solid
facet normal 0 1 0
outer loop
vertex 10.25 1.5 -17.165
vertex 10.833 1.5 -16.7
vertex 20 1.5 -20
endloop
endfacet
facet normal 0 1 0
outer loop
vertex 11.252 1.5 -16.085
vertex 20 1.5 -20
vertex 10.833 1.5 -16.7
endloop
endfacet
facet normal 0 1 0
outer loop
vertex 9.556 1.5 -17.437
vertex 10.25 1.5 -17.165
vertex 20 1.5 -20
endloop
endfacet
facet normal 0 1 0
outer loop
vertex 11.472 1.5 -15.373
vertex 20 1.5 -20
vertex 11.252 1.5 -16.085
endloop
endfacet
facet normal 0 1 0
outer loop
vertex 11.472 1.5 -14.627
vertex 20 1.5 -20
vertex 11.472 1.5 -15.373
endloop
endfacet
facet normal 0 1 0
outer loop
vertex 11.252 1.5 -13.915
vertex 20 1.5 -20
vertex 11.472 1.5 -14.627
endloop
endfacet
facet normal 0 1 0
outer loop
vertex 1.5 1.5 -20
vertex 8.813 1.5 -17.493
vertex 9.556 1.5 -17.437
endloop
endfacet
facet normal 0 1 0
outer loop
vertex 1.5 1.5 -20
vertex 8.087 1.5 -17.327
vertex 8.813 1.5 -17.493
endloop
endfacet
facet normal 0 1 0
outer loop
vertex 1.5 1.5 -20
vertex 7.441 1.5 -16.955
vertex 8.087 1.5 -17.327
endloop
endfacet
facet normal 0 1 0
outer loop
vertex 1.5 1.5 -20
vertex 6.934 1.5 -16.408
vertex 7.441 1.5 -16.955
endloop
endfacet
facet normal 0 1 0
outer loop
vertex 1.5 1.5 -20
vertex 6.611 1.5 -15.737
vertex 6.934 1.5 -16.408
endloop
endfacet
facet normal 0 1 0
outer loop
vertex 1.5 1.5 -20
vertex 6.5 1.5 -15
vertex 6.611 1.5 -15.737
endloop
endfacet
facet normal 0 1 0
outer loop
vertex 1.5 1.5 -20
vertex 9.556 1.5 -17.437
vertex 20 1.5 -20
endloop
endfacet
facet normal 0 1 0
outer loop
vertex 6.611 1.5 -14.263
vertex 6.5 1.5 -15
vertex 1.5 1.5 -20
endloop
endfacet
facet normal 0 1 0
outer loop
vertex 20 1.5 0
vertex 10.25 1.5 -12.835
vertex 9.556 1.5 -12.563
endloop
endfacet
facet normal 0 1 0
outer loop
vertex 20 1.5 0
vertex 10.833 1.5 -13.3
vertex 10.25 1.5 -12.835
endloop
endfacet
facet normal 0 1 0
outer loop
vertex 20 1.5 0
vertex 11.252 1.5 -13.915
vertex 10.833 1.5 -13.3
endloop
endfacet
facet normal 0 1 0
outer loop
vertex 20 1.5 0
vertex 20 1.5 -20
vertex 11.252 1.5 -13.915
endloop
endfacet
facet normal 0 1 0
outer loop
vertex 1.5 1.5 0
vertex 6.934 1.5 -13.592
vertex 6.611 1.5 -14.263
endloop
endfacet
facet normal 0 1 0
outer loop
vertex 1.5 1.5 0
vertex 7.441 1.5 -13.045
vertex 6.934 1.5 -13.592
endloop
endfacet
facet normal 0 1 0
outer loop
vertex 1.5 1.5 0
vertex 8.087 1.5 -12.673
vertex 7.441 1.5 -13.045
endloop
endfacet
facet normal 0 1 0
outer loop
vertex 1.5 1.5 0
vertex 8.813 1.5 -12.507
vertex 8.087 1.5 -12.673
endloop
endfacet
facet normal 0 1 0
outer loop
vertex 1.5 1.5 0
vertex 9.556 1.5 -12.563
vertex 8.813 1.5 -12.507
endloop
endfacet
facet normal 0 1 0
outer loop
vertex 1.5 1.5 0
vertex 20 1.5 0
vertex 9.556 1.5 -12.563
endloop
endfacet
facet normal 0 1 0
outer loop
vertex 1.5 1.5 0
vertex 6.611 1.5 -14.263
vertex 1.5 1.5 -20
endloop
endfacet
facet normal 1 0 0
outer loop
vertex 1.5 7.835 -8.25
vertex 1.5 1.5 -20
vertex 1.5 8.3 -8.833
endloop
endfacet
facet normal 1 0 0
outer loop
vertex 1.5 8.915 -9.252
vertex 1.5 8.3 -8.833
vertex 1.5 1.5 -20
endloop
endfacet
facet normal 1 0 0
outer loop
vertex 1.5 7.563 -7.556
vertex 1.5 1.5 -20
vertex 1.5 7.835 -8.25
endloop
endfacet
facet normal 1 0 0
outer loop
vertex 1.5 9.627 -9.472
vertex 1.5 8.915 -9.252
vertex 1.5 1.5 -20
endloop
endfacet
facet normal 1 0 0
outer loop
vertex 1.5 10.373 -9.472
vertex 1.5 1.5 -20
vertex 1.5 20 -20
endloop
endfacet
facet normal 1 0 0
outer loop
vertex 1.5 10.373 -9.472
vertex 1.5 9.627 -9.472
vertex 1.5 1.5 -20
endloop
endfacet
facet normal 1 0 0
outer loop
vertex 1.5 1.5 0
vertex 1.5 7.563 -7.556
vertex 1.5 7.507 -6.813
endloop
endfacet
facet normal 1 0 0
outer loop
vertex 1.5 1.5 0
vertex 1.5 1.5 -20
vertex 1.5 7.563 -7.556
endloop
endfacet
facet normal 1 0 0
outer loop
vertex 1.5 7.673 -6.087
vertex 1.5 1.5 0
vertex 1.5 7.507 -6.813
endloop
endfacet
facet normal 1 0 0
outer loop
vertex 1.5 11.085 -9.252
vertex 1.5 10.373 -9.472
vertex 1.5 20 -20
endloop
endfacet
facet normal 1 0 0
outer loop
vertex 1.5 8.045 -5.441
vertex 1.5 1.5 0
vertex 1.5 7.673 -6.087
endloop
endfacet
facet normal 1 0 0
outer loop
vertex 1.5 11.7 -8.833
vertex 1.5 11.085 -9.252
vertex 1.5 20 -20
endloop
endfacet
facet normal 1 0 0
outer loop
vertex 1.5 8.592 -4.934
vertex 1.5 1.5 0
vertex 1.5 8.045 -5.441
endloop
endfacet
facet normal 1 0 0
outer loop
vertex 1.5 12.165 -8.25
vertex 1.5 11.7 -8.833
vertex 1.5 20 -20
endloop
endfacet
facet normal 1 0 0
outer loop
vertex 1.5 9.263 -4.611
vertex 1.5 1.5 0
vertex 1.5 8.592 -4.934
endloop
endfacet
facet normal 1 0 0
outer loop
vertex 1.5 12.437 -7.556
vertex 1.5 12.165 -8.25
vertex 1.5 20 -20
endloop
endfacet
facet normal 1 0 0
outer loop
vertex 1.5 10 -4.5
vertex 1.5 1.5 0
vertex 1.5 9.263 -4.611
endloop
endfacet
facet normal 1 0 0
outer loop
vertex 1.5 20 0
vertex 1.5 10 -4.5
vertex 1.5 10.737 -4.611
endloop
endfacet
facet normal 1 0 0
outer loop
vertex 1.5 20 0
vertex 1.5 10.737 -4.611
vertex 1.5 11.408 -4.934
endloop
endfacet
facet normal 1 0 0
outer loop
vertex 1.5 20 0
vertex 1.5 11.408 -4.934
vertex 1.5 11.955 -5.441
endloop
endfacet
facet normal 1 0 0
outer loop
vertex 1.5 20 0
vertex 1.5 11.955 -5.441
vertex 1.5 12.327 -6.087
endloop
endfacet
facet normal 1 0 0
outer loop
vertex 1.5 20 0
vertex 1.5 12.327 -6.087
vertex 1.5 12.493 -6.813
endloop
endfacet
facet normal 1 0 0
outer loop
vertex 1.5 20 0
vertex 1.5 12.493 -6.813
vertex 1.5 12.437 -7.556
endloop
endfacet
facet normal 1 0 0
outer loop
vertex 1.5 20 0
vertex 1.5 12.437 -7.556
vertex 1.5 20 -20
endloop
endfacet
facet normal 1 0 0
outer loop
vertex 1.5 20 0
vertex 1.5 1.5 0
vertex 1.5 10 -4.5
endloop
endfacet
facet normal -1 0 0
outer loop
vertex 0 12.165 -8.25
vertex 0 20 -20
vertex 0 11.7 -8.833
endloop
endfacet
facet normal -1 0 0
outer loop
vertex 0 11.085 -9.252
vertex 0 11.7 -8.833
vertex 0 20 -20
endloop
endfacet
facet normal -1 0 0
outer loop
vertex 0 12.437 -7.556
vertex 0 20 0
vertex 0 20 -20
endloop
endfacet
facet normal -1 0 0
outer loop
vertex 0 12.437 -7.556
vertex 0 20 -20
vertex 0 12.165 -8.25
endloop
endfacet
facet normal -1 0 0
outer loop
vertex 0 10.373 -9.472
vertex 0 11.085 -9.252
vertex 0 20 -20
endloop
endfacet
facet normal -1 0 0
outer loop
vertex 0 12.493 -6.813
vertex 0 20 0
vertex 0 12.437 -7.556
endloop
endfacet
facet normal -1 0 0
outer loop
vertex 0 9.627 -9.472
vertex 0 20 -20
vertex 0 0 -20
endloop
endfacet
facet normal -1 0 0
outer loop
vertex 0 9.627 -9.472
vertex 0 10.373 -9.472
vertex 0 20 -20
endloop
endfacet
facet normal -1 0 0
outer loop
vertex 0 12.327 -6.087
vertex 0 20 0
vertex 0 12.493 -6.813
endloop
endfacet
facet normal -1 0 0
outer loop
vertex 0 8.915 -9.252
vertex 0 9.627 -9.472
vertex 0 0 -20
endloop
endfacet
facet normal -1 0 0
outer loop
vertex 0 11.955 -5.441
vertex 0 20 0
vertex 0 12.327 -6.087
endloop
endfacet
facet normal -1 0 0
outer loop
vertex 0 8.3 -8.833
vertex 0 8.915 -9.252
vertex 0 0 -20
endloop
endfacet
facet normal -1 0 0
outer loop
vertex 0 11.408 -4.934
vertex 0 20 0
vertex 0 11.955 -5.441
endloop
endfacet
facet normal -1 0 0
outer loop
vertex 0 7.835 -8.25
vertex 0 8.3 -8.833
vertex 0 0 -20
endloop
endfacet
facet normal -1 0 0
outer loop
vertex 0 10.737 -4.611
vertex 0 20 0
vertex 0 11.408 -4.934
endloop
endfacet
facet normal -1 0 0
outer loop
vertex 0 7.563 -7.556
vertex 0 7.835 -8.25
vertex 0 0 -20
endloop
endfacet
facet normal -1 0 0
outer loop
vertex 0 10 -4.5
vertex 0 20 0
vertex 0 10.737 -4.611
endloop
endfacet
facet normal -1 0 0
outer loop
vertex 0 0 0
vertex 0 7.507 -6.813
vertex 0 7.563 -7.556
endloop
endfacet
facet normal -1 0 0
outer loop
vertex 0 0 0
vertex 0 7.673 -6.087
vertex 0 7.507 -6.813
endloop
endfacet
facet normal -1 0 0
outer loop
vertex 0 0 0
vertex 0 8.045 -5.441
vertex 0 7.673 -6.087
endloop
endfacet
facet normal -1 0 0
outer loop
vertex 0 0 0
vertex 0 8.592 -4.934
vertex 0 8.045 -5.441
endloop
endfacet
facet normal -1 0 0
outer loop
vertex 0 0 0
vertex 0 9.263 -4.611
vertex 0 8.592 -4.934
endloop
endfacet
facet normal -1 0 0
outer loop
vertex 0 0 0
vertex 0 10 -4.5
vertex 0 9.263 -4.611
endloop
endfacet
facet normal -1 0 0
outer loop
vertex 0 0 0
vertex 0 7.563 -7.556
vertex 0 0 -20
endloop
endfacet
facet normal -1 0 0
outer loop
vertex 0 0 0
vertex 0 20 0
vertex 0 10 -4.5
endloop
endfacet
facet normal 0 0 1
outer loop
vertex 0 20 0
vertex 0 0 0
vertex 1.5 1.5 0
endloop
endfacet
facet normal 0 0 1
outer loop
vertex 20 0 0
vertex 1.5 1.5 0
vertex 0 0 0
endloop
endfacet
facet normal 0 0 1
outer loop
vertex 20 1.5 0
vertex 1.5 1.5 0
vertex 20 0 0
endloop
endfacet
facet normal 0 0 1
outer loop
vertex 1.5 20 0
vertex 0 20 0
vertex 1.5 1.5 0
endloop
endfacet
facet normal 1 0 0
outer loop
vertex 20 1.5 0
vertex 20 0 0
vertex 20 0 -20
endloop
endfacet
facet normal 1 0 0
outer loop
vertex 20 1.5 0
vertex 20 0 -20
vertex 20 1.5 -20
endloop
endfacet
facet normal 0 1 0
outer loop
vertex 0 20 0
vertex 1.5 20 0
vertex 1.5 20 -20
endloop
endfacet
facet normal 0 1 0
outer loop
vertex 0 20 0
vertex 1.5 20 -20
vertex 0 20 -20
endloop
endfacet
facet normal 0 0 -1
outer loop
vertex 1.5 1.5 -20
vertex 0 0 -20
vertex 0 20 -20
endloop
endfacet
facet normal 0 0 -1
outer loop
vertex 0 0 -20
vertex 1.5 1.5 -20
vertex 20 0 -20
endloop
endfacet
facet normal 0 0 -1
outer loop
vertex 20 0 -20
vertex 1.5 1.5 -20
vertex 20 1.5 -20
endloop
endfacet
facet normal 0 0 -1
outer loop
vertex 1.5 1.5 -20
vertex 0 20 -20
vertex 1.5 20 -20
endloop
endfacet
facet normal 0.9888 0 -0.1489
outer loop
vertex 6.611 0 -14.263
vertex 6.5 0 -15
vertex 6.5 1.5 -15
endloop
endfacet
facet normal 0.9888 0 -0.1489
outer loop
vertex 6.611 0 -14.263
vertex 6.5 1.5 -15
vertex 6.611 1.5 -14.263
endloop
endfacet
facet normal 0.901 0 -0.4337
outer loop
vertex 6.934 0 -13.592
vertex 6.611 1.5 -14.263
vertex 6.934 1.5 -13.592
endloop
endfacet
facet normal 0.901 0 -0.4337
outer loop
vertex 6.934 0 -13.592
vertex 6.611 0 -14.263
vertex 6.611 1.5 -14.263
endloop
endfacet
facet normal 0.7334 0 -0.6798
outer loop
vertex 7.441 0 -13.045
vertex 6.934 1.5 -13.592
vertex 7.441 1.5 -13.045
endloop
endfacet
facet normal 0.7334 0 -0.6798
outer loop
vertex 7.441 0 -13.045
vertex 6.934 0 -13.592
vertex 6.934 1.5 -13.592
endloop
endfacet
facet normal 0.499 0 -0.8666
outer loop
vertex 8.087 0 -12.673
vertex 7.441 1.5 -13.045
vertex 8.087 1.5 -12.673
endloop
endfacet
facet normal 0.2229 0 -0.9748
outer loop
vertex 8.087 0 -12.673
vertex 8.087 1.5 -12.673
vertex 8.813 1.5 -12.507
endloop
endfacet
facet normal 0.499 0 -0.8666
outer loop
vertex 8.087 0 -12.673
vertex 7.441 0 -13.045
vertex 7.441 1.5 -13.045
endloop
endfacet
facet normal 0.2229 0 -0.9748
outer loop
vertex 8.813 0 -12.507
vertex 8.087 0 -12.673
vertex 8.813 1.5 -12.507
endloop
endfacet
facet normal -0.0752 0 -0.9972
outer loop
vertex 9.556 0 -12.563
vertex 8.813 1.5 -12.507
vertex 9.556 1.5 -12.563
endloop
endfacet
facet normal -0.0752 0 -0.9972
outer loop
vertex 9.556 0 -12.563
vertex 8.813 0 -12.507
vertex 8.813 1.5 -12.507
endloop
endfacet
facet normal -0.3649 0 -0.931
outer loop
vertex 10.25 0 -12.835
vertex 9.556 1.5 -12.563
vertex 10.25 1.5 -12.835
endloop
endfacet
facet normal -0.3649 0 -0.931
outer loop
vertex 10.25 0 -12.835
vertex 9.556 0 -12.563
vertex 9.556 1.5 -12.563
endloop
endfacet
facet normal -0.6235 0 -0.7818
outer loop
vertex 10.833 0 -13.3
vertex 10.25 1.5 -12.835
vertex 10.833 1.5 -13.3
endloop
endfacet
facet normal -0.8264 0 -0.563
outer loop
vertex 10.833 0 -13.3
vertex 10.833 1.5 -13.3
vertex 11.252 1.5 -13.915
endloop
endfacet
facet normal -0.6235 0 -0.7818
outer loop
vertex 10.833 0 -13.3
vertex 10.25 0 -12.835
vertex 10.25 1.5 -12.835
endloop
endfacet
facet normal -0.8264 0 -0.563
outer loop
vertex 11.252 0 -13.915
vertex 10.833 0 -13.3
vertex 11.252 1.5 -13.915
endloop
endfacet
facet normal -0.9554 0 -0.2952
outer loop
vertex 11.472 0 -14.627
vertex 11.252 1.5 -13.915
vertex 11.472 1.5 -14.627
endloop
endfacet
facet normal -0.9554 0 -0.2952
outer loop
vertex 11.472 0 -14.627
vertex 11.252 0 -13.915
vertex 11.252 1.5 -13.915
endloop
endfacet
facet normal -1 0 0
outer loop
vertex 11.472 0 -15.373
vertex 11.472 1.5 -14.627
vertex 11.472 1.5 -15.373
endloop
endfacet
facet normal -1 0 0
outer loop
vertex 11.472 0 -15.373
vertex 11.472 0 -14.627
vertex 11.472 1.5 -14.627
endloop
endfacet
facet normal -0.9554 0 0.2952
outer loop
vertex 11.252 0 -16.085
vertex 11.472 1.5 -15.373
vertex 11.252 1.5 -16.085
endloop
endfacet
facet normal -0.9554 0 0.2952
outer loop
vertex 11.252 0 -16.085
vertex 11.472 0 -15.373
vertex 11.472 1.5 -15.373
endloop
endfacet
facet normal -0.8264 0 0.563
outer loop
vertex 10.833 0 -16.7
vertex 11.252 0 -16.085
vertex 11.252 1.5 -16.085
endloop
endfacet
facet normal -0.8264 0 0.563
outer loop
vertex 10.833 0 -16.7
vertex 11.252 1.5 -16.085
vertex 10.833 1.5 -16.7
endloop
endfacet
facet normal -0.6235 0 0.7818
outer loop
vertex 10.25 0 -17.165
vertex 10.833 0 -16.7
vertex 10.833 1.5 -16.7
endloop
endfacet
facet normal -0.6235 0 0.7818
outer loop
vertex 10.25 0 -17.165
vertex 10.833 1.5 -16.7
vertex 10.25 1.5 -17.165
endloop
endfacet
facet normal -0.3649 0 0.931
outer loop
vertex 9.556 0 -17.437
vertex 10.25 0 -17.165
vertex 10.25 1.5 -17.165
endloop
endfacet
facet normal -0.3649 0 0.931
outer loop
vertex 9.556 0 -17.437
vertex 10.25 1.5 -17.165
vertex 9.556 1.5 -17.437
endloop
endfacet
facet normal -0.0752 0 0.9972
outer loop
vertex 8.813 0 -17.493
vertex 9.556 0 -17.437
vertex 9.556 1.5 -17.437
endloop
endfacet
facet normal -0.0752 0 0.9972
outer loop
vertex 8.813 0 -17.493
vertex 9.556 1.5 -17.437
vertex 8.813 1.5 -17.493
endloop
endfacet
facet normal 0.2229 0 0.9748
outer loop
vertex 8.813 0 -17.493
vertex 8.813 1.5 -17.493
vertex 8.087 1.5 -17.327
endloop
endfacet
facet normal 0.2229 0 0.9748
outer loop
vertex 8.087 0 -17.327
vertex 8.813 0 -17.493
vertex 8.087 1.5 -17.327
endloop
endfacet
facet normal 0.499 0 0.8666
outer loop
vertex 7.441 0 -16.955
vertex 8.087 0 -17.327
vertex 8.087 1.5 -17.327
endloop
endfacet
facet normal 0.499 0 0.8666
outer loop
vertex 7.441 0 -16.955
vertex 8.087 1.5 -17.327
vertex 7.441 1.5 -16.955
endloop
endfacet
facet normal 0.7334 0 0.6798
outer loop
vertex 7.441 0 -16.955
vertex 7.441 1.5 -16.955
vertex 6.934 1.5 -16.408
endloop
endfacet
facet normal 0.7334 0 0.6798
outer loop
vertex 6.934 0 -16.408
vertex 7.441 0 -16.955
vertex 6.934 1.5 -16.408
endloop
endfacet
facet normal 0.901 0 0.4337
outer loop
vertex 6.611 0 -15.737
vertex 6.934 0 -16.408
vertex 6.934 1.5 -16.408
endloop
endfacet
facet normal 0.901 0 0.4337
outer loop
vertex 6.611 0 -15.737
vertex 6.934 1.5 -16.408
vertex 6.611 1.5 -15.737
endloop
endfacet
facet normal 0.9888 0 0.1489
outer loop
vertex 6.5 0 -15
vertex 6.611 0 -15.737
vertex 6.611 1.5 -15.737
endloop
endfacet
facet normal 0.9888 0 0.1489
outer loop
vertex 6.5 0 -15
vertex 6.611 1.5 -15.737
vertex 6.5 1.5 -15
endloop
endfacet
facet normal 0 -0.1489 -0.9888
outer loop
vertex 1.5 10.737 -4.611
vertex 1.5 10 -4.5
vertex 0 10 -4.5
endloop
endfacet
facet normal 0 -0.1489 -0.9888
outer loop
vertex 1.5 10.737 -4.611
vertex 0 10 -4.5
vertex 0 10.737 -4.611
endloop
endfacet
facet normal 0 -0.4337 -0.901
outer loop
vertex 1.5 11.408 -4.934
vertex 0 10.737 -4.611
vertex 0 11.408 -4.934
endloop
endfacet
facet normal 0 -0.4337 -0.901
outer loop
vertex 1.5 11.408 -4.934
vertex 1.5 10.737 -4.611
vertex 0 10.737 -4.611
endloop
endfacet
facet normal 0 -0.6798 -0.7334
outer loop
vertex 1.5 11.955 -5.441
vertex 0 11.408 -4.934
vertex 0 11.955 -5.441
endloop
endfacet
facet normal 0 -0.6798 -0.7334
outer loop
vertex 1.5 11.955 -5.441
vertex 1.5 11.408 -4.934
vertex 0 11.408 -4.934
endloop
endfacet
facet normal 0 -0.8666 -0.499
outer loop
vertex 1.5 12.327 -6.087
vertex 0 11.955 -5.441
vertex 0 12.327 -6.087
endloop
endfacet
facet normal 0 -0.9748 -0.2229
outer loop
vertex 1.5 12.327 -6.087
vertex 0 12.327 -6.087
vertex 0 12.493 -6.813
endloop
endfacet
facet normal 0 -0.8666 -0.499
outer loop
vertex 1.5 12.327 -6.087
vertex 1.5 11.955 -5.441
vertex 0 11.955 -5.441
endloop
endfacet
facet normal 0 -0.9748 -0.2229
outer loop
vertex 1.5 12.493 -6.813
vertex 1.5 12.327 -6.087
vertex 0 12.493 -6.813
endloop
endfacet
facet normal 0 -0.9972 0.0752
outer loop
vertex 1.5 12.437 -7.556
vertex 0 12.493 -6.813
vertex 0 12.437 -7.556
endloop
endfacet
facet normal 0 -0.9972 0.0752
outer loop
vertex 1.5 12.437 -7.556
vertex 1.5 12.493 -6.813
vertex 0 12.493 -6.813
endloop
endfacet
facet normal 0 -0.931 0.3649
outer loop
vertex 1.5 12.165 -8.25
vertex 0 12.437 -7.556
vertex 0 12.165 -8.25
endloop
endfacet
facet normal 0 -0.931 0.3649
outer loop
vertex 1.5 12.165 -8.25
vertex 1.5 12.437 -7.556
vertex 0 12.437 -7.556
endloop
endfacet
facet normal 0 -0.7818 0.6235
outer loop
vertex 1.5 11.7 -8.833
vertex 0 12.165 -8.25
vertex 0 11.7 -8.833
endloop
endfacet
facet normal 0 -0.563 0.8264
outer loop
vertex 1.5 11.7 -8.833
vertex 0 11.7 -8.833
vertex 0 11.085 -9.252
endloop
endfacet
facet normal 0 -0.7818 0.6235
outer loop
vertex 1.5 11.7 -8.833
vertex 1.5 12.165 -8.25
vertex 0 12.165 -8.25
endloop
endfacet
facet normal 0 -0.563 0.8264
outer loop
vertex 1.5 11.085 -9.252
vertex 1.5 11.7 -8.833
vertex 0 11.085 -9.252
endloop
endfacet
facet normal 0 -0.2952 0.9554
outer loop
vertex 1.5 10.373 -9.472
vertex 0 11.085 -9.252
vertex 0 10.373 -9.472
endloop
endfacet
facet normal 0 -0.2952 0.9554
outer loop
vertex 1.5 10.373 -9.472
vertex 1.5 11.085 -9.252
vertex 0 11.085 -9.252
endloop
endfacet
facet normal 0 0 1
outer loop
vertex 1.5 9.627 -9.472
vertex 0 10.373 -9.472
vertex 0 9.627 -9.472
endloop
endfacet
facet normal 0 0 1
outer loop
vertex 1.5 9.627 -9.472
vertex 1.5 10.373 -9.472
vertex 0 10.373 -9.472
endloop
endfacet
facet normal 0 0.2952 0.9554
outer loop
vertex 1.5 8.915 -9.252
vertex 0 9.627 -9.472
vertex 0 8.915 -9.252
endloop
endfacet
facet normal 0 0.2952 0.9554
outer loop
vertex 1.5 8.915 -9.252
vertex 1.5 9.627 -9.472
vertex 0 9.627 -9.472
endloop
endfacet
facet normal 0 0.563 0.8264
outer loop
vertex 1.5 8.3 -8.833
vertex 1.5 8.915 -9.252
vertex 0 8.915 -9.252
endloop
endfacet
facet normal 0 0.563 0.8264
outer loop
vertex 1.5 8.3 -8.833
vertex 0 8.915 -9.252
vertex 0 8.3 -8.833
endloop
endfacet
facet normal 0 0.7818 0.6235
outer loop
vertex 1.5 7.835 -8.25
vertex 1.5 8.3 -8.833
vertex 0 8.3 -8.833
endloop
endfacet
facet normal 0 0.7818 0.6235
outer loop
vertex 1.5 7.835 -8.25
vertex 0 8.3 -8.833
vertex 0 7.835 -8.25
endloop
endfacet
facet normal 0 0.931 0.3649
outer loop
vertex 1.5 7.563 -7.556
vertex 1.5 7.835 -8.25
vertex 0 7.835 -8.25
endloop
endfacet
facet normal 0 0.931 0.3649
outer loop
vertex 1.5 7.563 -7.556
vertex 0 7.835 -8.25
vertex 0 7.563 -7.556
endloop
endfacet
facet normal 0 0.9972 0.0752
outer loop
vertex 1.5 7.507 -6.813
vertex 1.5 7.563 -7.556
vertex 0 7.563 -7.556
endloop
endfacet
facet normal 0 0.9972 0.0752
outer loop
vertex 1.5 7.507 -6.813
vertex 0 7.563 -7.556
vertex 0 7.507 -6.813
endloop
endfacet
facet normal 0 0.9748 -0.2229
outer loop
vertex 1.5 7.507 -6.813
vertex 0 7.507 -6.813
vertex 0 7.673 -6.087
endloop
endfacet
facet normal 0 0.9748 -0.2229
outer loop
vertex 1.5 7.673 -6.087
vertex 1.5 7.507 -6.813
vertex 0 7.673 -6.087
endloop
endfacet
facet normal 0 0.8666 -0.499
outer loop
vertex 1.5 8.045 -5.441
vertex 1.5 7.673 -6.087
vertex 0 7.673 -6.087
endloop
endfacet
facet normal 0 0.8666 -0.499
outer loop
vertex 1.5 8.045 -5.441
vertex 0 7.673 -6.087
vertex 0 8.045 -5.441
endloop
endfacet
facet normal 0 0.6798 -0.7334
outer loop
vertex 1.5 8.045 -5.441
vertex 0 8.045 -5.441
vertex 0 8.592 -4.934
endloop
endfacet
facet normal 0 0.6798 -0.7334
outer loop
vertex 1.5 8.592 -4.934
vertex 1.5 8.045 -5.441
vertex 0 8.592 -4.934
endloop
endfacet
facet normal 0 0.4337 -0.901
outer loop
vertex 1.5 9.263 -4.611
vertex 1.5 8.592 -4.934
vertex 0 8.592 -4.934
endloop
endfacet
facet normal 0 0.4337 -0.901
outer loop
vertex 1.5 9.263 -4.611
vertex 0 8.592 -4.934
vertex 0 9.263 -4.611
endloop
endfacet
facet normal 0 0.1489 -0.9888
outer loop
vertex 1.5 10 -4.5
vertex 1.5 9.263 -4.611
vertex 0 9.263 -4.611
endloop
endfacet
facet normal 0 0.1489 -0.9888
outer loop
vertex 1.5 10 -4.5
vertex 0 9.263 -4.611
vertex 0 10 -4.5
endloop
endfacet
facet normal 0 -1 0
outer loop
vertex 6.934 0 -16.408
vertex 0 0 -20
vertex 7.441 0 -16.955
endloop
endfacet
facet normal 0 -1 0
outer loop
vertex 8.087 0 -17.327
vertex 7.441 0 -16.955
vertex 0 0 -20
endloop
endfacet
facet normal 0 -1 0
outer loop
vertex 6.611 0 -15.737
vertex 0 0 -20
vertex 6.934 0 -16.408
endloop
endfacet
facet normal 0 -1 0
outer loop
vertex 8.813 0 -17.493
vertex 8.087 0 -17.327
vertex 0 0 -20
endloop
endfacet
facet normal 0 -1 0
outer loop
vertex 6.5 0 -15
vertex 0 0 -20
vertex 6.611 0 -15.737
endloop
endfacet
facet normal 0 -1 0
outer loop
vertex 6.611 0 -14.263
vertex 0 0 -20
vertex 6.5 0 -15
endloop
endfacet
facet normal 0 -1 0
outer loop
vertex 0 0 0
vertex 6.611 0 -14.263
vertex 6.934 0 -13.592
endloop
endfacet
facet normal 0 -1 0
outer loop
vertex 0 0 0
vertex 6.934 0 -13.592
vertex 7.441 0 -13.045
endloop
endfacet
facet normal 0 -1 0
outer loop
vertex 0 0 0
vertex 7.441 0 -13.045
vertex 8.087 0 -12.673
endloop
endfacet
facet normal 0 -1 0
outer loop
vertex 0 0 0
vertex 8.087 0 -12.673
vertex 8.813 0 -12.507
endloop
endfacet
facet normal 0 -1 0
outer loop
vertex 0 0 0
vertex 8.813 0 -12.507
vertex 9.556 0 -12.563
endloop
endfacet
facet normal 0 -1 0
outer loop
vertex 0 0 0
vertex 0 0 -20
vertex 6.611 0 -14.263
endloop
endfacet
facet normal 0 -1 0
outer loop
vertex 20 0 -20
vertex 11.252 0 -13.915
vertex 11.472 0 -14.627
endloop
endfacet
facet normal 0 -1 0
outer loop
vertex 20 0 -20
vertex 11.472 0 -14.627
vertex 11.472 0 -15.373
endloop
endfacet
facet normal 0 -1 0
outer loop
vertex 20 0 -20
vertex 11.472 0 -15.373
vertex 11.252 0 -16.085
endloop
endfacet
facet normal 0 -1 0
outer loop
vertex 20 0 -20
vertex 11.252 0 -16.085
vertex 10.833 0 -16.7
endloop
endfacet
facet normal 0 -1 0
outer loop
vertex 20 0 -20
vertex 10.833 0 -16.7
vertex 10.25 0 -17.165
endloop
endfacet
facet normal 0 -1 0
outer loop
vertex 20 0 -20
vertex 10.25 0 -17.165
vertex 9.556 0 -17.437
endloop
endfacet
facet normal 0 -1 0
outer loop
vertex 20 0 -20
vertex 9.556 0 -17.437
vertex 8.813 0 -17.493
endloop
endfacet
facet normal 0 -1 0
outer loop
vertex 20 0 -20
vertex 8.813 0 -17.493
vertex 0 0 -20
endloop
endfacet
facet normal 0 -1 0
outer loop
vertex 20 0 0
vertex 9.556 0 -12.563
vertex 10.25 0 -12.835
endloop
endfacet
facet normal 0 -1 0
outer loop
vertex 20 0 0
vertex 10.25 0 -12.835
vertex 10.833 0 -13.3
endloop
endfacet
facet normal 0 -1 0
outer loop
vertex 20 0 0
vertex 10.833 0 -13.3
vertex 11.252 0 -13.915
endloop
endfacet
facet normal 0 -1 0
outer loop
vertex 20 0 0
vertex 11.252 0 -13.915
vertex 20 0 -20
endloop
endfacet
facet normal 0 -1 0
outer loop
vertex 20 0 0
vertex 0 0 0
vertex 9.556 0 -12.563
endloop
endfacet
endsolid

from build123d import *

# Parameters (mm, degrees)
EXTRUDE_THIN1_DEPTH = 20
SKETCH2_R           = 2.5
CUT_EXTRUDE1_DEPTH  = 21
SKETCH3_R           = 2.5
CUT_EXTRUDE2_DEPTH  = 2.5


with BuildPart() as part:
    # Sketch1 → Extrude-Thin1 (new body)
    with BuildSketch(Plane.XY):
        Polygon((0, 20), (0, 0), (20, 0), (20, 1.5), (1.5, 1.5), (1.5, 20), align=None)
    extrude(amount=EXTRUDE_THIN1_DEPTH)

    # Sketch2 → Cut-Extrude1 (cut, through all)
    with BuildSketch(Plane(origin=(0, 0, 0), x_dir=(-1, 0, 0), z_dir=(0, -1, 0))):
        with Locations((-9, -15)):
            Circle(SKETCH2_R)
    extrude(amount=-CUT_EXTRUDE1_DEPTH, mode=Mode.SUBTRACT)

    # Sketch3 → Cut-Extrude2 (cut, through all)
    with BuildSketch(Plane(origin=(1.5, 0, 0), x_dir=(0, 0, -1), z_dir=(1, 0, 0))):
        with Locations((-7, 10)):
            Circle(SKETCH3_R)
    extrude(amount=-CUT_EXTRUDE2_DEPTH, mode=Mode.SUBTRACT)


with BuildPart() as body_2:
    # Mirror1: mirrored copy
    add(part.part.mirror(Plane.XY))


solid = body_2.part
